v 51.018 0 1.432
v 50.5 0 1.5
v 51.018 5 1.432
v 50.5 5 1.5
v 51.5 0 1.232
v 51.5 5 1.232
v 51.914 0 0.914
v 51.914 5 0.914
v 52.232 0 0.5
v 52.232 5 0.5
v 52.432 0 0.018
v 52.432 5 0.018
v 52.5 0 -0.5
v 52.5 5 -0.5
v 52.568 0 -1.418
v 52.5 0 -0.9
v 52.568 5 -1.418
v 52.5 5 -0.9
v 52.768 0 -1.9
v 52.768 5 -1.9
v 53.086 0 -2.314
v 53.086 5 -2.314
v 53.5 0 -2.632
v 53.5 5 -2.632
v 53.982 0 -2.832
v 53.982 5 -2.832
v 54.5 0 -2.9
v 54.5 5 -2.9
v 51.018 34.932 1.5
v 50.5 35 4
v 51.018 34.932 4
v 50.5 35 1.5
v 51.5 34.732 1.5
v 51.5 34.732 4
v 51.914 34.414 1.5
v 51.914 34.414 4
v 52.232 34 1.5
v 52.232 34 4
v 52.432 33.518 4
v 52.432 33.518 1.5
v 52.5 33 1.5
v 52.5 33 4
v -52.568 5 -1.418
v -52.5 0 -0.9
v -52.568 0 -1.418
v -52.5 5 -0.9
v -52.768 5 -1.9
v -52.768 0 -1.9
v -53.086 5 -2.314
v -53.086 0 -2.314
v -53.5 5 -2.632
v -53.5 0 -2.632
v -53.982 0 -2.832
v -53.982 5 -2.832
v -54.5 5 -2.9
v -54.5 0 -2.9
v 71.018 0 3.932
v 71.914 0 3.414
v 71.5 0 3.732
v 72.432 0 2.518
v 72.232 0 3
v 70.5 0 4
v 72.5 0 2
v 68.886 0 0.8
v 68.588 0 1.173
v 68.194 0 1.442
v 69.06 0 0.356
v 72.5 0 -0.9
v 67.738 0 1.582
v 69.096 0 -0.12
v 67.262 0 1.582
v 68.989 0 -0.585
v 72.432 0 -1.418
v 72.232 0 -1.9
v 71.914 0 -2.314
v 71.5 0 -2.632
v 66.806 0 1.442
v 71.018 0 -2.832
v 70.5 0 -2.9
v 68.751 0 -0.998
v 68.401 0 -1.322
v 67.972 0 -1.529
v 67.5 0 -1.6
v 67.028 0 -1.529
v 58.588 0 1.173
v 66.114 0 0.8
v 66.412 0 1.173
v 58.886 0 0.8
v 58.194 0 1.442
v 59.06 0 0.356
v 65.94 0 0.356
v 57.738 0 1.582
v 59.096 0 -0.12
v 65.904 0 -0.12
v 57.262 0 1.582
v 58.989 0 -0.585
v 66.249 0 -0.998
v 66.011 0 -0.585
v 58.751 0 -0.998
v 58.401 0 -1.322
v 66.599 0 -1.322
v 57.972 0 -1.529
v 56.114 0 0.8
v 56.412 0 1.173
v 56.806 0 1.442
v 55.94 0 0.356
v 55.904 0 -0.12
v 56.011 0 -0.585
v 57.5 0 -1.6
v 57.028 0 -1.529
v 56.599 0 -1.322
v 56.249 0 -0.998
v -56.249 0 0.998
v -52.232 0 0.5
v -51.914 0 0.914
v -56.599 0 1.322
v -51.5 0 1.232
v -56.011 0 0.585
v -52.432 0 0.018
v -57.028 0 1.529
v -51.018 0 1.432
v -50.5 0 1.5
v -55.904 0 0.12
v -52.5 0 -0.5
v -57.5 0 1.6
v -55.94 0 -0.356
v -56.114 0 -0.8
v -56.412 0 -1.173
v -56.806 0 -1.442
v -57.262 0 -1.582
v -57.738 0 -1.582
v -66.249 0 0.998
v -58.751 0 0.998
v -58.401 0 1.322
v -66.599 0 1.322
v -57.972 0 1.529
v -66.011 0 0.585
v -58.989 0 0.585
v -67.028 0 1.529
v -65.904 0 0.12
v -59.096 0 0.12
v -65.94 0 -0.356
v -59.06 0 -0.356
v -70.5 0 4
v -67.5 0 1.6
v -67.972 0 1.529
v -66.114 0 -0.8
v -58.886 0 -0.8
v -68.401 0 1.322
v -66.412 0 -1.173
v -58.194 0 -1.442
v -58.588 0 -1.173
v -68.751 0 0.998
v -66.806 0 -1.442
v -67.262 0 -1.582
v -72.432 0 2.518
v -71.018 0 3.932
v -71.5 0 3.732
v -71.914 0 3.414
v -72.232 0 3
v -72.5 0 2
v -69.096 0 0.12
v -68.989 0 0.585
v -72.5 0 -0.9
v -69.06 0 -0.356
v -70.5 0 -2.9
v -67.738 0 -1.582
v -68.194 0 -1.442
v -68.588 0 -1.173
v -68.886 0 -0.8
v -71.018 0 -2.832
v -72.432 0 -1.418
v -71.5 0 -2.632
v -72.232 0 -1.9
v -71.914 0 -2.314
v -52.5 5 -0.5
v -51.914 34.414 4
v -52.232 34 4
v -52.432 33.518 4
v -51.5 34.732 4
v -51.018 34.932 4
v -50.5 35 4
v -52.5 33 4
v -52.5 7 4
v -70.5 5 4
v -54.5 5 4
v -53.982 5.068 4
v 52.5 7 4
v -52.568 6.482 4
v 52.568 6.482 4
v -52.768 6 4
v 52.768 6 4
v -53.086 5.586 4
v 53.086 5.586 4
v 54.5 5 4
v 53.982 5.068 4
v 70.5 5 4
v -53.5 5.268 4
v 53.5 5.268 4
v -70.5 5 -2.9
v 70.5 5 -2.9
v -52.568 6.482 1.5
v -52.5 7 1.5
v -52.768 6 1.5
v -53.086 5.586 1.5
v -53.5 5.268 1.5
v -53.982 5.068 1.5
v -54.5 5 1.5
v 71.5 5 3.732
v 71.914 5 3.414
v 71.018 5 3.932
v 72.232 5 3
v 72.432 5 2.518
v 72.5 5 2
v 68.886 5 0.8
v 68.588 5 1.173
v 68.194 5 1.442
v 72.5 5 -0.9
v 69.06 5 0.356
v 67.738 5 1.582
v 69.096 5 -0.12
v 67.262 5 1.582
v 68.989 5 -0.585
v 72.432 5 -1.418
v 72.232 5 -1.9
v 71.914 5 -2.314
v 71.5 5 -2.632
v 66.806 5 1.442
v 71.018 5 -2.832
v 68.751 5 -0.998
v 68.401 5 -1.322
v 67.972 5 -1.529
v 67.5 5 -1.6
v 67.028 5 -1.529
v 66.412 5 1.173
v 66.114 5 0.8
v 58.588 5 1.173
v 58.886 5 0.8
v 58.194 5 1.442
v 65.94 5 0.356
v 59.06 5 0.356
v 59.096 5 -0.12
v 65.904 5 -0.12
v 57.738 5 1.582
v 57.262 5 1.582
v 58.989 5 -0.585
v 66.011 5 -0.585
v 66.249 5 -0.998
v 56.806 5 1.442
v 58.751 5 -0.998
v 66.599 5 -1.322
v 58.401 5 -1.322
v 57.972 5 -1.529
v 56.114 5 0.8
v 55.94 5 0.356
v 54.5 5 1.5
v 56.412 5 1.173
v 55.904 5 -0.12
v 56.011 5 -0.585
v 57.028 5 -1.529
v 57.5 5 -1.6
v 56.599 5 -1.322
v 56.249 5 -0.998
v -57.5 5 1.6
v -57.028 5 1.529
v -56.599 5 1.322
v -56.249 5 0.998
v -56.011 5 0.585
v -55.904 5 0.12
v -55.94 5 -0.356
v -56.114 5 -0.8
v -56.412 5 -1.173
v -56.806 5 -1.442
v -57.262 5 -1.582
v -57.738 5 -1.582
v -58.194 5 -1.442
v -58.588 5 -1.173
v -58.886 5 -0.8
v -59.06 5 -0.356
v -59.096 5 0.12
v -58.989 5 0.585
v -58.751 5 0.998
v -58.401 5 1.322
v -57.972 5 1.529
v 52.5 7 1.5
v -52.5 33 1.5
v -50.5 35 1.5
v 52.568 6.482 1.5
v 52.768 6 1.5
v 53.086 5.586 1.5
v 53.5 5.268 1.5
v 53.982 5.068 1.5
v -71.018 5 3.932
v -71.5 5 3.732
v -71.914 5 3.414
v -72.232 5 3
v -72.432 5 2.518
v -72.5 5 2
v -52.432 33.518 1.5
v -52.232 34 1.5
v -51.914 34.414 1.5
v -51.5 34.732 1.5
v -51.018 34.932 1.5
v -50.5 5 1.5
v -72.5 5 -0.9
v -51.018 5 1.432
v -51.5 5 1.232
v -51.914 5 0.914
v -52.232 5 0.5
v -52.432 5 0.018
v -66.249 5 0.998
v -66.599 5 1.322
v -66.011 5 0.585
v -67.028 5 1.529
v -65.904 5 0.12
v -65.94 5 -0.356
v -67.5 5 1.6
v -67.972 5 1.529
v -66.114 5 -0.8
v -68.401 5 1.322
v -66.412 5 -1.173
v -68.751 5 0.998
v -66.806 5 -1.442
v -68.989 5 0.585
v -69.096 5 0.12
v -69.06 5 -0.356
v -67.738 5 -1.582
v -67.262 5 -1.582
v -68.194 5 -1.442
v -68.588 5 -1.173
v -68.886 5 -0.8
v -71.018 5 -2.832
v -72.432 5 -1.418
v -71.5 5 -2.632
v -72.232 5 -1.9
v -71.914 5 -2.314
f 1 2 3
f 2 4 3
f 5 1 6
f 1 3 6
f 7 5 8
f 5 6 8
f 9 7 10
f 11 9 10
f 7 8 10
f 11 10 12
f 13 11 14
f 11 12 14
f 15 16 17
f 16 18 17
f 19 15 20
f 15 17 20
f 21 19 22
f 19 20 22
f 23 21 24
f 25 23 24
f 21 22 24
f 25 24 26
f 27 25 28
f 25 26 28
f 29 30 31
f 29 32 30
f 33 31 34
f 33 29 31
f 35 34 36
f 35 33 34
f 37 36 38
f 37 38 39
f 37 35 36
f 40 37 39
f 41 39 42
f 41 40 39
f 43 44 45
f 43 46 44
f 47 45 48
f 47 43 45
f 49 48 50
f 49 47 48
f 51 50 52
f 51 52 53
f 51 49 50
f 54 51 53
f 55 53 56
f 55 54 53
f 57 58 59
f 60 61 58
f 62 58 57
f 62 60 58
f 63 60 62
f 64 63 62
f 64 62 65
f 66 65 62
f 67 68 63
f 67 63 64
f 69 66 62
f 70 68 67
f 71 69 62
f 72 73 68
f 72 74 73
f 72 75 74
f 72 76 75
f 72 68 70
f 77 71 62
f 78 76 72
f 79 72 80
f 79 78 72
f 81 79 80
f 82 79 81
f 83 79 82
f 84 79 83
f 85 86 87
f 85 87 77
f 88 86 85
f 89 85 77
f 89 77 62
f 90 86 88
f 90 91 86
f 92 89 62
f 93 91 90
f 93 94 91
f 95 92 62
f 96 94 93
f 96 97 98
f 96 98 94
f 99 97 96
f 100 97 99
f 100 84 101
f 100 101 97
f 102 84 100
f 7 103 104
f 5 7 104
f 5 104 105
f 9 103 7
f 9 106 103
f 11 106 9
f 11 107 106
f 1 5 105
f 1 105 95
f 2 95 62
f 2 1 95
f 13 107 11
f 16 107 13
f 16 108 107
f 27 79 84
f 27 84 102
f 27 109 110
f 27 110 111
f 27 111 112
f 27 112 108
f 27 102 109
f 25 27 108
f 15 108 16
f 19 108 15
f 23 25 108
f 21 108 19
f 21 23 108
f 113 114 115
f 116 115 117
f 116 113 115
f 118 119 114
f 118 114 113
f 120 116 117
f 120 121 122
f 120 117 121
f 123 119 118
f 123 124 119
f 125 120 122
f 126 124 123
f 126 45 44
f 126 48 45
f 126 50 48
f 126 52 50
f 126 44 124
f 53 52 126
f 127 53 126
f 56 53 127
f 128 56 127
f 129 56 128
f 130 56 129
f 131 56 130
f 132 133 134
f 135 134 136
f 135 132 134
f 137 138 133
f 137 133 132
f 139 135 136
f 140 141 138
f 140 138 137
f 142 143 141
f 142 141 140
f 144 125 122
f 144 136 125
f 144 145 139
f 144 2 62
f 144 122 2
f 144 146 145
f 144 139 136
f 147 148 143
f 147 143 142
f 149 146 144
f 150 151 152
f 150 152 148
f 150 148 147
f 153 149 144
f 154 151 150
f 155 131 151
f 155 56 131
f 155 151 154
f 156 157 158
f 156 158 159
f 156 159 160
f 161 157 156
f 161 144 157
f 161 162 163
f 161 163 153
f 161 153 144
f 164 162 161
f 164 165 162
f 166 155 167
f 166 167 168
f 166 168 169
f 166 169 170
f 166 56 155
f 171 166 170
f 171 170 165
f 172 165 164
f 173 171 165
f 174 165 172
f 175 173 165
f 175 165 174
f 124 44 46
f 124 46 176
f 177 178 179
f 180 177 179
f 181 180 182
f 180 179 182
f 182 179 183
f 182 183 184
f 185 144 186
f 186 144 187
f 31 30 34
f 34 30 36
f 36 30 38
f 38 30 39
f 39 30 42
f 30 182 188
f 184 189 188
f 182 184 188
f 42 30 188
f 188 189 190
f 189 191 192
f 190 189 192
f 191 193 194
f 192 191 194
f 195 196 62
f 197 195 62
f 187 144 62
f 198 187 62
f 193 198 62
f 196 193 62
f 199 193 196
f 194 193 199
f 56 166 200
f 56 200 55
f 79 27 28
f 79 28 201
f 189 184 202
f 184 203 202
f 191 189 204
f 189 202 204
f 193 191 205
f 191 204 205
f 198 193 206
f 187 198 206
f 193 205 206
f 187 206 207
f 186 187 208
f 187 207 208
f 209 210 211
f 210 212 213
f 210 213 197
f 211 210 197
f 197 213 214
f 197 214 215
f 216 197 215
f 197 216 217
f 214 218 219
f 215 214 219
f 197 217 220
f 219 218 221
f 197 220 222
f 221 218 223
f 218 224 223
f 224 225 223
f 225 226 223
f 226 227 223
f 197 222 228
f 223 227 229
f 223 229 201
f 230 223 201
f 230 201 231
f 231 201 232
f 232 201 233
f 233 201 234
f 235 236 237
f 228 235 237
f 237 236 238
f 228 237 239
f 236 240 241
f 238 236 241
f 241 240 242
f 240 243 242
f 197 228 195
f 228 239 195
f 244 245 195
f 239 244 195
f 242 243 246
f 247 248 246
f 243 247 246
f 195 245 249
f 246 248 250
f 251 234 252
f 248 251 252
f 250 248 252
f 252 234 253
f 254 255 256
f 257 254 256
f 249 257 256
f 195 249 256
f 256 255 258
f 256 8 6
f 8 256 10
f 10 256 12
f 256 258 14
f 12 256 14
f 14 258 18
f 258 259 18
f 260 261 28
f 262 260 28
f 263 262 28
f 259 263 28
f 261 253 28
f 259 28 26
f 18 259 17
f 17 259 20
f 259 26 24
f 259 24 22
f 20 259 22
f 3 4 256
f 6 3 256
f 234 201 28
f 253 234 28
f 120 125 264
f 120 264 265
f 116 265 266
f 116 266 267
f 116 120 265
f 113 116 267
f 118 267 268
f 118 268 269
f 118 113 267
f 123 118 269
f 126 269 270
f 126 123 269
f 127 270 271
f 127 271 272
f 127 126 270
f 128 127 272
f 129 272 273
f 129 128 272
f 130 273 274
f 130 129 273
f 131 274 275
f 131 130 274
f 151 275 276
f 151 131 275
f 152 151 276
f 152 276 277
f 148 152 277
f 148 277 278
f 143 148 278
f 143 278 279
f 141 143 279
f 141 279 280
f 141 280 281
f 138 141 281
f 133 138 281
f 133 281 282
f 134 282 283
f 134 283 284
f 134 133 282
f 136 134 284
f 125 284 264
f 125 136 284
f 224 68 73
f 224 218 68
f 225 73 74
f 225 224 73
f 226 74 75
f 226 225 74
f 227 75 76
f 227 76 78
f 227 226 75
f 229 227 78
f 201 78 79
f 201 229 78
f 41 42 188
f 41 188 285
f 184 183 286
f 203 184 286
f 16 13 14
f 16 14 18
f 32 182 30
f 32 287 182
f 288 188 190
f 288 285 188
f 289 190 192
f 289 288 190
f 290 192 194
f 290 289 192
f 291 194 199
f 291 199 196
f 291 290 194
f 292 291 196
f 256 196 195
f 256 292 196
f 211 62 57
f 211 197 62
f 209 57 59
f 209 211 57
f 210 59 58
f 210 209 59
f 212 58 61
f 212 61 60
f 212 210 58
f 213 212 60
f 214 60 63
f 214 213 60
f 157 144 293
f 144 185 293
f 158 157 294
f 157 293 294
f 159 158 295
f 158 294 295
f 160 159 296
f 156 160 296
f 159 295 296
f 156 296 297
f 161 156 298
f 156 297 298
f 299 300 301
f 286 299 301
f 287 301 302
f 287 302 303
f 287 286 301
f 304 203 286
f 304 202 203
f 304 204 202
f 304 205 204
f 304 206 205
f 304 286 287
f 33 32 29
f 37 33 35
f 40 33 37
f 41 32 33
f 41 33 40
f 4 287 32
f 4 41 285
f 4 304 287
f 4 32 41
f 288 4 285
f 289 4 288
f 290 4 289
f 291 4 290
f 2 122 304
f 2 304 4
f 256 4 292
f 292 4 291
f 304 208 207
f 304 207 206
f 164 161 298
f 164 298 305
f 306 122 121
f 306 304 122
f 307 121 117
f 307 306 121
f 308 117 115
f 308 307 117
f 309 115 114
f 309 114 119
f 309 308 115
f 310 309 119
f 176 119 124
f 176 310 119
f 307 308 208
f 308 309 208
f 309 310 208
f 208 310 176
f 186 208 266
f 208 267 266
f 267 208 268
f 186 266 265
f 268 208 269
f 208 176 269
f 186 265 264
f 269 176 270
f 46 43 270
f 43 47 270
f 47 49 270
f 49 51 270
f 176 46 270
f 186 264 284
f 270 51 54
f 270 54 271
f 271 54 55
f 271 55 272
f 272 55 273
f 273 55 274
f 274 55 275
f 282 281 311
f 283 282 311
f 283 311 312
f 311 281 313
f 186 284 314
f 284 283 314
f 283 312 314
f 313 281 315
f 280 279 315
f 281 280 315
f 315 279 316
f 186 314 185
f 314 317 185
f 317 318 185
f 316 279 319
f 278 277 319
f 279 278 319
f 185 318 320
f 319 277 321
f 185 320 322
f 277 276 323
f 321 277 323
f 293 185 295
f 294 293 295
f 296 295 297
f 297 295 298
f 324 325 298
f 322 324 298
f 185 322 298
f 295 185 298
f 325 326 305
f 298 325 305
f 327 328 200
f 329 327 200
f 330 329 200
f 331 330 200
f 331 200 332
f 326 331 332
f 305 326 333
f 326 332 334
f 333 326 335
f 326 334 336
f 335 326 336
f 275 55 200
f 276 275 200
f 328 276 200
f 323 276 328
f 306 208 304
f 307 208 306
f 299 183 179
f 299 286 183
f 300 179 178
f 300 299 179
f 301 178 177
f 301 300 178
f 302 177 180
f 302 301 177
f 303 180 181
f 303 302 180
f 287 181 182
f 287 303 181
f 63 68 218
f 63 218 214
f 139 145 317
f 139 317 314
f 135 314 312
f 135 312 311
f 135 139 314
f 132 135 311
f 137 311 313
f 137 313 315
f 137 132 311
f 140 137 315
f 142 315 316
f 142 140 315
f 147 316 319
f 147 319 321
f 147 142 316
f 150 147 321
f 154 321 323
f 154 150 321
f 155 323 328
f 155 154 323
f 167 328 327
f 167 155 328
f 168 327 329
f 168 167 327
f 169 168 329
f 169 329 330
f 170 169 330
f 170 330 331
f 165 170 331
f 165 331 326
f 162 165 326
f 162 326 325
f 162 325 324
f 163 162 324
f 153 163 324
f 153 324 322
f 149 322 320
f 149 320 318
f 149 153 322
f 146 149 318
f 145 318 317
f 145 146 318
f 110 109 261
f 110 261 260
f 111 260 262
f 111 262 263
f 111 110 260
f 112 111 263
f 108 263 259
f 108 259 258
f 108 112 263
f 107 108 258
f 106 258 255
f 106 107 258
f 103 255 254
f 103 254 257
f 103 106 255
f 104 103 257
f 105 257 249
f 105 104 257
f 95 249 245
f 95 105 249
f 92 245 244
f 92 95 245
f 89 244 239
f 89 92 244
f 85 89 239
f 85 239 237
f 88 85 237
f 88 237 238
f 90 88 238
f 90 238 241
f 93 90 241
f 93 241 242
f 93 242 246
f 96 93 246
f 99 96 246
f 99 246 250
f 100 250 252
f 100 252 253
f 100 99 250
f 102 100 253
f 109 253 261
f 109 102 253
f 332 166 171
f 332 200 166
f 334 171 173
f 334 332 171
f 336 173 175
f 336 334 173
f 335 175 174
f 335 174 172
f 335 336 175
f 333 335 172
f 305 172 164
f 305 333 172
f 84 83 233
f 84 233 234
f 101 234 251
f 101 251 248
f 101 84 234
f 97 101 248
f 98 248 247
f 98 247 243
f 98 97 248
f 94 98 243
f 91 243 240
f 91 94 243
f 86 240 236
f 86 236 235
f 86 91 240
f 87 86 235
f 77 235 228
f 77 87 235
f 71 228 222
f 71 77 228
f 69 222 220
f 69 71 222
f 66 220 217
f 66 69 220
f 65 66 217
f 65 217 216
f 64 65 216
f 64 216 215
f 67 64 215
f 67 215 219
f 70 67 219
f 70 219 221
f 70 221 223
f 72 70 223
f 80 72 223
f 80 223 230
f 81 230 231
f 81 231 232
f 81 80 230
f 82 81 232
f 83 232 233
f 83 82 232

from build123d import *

# Parameters (mm, degrees)
SKETCH_1_R      = 1.6
EXTRUDE_1_DEPTH = 5
SKETCH_2_W      = 105
SKETCH_2_H      = 2.5
EXTRUDE_2_DEPTH = 30
FILLET_4_R      = 2
FILLET_5_R      = 2


with BuildPart() as part:
    # 草图1 → 凸台-拉伸1 (new body)
    with BuildSketch(Plane(origin=(0, 0, 0), x_dir=(1, 0, 0), z_dir=(0, 1, 0))):
        Polygon((72.5, -4), (-72.5, -4), (-72.5, 2.9), (-52.5, 2.9), (-52.5, -1.5), (52.5, -1.5), (52.5, 2.9), (72.5, 2.9), align=None)
        with Locations(Location((-67.5, 0, 0), (0, 0, 270))):
            Circle(SKETCH_1_R, mode=Mode.SUBTRACT)
        with Locations(Location((-57.5, 0, 0), (0, 0, 270))):
            Circle(SKETCH_1_R, mode=Mode.SUBTRACT)
        with Locations(Location((67.5, 0, 0), (0, 0, 90))):
            Circle(SKETCH_1_R, mode=Mode.SUBTRACT)
        with Locations(Location((57.5, 0, 0), (0, 0, 90))):
            Circle(SKETCH_1_R, mode=Mode.SUBTRACT)
    extrude(amount=EXTRUDE_1_DEPTH)

    # 草图2 → 凸台-拉伸2 (add)
    with BuildSketch(Plane(origin=(0, 5, 0), x_dir=(1, 0, 0), z_dir=(0, 1, 0))):
        with Locations((0, -2.75)):
            Rectangle(SKETCH_2_W, SKETCH_2_H)
    extrude(amount=EXTRUDE_2_DEPTH)

    # 圆角4
    fillet_4_edges = [part.edges().sort_by_distance(p)[0] for p in [
        (72.5, 2.5, 4),
        (-72.5, 2.5, 4),
        (72.5, 2.5, -2.9),
        (-72.5, 2.5, -2.9),
        (52.5, 2.5, -2.9),
        (-52.5, 2.5, -2.9),
        (-52.5, 2.5, 1.5),
        (52.5, 2.5, 1.5),
        (52.5, 35, 2.75),
        (-52.5, 35, 2.75),
    ]]
    fillet(fillet_4_edges, radius=FILLET_4_R)

    # 圆角5
    fillet_5_edges = [part.edges().sort_by_distance(p)[0] for p in [
        (-52.5, 5, 2.75),
        (52.5, 5, 2.75),
    ]]
    fillet(fillet_5_edges, radius=FILLET_5_R)


solid = part.part
